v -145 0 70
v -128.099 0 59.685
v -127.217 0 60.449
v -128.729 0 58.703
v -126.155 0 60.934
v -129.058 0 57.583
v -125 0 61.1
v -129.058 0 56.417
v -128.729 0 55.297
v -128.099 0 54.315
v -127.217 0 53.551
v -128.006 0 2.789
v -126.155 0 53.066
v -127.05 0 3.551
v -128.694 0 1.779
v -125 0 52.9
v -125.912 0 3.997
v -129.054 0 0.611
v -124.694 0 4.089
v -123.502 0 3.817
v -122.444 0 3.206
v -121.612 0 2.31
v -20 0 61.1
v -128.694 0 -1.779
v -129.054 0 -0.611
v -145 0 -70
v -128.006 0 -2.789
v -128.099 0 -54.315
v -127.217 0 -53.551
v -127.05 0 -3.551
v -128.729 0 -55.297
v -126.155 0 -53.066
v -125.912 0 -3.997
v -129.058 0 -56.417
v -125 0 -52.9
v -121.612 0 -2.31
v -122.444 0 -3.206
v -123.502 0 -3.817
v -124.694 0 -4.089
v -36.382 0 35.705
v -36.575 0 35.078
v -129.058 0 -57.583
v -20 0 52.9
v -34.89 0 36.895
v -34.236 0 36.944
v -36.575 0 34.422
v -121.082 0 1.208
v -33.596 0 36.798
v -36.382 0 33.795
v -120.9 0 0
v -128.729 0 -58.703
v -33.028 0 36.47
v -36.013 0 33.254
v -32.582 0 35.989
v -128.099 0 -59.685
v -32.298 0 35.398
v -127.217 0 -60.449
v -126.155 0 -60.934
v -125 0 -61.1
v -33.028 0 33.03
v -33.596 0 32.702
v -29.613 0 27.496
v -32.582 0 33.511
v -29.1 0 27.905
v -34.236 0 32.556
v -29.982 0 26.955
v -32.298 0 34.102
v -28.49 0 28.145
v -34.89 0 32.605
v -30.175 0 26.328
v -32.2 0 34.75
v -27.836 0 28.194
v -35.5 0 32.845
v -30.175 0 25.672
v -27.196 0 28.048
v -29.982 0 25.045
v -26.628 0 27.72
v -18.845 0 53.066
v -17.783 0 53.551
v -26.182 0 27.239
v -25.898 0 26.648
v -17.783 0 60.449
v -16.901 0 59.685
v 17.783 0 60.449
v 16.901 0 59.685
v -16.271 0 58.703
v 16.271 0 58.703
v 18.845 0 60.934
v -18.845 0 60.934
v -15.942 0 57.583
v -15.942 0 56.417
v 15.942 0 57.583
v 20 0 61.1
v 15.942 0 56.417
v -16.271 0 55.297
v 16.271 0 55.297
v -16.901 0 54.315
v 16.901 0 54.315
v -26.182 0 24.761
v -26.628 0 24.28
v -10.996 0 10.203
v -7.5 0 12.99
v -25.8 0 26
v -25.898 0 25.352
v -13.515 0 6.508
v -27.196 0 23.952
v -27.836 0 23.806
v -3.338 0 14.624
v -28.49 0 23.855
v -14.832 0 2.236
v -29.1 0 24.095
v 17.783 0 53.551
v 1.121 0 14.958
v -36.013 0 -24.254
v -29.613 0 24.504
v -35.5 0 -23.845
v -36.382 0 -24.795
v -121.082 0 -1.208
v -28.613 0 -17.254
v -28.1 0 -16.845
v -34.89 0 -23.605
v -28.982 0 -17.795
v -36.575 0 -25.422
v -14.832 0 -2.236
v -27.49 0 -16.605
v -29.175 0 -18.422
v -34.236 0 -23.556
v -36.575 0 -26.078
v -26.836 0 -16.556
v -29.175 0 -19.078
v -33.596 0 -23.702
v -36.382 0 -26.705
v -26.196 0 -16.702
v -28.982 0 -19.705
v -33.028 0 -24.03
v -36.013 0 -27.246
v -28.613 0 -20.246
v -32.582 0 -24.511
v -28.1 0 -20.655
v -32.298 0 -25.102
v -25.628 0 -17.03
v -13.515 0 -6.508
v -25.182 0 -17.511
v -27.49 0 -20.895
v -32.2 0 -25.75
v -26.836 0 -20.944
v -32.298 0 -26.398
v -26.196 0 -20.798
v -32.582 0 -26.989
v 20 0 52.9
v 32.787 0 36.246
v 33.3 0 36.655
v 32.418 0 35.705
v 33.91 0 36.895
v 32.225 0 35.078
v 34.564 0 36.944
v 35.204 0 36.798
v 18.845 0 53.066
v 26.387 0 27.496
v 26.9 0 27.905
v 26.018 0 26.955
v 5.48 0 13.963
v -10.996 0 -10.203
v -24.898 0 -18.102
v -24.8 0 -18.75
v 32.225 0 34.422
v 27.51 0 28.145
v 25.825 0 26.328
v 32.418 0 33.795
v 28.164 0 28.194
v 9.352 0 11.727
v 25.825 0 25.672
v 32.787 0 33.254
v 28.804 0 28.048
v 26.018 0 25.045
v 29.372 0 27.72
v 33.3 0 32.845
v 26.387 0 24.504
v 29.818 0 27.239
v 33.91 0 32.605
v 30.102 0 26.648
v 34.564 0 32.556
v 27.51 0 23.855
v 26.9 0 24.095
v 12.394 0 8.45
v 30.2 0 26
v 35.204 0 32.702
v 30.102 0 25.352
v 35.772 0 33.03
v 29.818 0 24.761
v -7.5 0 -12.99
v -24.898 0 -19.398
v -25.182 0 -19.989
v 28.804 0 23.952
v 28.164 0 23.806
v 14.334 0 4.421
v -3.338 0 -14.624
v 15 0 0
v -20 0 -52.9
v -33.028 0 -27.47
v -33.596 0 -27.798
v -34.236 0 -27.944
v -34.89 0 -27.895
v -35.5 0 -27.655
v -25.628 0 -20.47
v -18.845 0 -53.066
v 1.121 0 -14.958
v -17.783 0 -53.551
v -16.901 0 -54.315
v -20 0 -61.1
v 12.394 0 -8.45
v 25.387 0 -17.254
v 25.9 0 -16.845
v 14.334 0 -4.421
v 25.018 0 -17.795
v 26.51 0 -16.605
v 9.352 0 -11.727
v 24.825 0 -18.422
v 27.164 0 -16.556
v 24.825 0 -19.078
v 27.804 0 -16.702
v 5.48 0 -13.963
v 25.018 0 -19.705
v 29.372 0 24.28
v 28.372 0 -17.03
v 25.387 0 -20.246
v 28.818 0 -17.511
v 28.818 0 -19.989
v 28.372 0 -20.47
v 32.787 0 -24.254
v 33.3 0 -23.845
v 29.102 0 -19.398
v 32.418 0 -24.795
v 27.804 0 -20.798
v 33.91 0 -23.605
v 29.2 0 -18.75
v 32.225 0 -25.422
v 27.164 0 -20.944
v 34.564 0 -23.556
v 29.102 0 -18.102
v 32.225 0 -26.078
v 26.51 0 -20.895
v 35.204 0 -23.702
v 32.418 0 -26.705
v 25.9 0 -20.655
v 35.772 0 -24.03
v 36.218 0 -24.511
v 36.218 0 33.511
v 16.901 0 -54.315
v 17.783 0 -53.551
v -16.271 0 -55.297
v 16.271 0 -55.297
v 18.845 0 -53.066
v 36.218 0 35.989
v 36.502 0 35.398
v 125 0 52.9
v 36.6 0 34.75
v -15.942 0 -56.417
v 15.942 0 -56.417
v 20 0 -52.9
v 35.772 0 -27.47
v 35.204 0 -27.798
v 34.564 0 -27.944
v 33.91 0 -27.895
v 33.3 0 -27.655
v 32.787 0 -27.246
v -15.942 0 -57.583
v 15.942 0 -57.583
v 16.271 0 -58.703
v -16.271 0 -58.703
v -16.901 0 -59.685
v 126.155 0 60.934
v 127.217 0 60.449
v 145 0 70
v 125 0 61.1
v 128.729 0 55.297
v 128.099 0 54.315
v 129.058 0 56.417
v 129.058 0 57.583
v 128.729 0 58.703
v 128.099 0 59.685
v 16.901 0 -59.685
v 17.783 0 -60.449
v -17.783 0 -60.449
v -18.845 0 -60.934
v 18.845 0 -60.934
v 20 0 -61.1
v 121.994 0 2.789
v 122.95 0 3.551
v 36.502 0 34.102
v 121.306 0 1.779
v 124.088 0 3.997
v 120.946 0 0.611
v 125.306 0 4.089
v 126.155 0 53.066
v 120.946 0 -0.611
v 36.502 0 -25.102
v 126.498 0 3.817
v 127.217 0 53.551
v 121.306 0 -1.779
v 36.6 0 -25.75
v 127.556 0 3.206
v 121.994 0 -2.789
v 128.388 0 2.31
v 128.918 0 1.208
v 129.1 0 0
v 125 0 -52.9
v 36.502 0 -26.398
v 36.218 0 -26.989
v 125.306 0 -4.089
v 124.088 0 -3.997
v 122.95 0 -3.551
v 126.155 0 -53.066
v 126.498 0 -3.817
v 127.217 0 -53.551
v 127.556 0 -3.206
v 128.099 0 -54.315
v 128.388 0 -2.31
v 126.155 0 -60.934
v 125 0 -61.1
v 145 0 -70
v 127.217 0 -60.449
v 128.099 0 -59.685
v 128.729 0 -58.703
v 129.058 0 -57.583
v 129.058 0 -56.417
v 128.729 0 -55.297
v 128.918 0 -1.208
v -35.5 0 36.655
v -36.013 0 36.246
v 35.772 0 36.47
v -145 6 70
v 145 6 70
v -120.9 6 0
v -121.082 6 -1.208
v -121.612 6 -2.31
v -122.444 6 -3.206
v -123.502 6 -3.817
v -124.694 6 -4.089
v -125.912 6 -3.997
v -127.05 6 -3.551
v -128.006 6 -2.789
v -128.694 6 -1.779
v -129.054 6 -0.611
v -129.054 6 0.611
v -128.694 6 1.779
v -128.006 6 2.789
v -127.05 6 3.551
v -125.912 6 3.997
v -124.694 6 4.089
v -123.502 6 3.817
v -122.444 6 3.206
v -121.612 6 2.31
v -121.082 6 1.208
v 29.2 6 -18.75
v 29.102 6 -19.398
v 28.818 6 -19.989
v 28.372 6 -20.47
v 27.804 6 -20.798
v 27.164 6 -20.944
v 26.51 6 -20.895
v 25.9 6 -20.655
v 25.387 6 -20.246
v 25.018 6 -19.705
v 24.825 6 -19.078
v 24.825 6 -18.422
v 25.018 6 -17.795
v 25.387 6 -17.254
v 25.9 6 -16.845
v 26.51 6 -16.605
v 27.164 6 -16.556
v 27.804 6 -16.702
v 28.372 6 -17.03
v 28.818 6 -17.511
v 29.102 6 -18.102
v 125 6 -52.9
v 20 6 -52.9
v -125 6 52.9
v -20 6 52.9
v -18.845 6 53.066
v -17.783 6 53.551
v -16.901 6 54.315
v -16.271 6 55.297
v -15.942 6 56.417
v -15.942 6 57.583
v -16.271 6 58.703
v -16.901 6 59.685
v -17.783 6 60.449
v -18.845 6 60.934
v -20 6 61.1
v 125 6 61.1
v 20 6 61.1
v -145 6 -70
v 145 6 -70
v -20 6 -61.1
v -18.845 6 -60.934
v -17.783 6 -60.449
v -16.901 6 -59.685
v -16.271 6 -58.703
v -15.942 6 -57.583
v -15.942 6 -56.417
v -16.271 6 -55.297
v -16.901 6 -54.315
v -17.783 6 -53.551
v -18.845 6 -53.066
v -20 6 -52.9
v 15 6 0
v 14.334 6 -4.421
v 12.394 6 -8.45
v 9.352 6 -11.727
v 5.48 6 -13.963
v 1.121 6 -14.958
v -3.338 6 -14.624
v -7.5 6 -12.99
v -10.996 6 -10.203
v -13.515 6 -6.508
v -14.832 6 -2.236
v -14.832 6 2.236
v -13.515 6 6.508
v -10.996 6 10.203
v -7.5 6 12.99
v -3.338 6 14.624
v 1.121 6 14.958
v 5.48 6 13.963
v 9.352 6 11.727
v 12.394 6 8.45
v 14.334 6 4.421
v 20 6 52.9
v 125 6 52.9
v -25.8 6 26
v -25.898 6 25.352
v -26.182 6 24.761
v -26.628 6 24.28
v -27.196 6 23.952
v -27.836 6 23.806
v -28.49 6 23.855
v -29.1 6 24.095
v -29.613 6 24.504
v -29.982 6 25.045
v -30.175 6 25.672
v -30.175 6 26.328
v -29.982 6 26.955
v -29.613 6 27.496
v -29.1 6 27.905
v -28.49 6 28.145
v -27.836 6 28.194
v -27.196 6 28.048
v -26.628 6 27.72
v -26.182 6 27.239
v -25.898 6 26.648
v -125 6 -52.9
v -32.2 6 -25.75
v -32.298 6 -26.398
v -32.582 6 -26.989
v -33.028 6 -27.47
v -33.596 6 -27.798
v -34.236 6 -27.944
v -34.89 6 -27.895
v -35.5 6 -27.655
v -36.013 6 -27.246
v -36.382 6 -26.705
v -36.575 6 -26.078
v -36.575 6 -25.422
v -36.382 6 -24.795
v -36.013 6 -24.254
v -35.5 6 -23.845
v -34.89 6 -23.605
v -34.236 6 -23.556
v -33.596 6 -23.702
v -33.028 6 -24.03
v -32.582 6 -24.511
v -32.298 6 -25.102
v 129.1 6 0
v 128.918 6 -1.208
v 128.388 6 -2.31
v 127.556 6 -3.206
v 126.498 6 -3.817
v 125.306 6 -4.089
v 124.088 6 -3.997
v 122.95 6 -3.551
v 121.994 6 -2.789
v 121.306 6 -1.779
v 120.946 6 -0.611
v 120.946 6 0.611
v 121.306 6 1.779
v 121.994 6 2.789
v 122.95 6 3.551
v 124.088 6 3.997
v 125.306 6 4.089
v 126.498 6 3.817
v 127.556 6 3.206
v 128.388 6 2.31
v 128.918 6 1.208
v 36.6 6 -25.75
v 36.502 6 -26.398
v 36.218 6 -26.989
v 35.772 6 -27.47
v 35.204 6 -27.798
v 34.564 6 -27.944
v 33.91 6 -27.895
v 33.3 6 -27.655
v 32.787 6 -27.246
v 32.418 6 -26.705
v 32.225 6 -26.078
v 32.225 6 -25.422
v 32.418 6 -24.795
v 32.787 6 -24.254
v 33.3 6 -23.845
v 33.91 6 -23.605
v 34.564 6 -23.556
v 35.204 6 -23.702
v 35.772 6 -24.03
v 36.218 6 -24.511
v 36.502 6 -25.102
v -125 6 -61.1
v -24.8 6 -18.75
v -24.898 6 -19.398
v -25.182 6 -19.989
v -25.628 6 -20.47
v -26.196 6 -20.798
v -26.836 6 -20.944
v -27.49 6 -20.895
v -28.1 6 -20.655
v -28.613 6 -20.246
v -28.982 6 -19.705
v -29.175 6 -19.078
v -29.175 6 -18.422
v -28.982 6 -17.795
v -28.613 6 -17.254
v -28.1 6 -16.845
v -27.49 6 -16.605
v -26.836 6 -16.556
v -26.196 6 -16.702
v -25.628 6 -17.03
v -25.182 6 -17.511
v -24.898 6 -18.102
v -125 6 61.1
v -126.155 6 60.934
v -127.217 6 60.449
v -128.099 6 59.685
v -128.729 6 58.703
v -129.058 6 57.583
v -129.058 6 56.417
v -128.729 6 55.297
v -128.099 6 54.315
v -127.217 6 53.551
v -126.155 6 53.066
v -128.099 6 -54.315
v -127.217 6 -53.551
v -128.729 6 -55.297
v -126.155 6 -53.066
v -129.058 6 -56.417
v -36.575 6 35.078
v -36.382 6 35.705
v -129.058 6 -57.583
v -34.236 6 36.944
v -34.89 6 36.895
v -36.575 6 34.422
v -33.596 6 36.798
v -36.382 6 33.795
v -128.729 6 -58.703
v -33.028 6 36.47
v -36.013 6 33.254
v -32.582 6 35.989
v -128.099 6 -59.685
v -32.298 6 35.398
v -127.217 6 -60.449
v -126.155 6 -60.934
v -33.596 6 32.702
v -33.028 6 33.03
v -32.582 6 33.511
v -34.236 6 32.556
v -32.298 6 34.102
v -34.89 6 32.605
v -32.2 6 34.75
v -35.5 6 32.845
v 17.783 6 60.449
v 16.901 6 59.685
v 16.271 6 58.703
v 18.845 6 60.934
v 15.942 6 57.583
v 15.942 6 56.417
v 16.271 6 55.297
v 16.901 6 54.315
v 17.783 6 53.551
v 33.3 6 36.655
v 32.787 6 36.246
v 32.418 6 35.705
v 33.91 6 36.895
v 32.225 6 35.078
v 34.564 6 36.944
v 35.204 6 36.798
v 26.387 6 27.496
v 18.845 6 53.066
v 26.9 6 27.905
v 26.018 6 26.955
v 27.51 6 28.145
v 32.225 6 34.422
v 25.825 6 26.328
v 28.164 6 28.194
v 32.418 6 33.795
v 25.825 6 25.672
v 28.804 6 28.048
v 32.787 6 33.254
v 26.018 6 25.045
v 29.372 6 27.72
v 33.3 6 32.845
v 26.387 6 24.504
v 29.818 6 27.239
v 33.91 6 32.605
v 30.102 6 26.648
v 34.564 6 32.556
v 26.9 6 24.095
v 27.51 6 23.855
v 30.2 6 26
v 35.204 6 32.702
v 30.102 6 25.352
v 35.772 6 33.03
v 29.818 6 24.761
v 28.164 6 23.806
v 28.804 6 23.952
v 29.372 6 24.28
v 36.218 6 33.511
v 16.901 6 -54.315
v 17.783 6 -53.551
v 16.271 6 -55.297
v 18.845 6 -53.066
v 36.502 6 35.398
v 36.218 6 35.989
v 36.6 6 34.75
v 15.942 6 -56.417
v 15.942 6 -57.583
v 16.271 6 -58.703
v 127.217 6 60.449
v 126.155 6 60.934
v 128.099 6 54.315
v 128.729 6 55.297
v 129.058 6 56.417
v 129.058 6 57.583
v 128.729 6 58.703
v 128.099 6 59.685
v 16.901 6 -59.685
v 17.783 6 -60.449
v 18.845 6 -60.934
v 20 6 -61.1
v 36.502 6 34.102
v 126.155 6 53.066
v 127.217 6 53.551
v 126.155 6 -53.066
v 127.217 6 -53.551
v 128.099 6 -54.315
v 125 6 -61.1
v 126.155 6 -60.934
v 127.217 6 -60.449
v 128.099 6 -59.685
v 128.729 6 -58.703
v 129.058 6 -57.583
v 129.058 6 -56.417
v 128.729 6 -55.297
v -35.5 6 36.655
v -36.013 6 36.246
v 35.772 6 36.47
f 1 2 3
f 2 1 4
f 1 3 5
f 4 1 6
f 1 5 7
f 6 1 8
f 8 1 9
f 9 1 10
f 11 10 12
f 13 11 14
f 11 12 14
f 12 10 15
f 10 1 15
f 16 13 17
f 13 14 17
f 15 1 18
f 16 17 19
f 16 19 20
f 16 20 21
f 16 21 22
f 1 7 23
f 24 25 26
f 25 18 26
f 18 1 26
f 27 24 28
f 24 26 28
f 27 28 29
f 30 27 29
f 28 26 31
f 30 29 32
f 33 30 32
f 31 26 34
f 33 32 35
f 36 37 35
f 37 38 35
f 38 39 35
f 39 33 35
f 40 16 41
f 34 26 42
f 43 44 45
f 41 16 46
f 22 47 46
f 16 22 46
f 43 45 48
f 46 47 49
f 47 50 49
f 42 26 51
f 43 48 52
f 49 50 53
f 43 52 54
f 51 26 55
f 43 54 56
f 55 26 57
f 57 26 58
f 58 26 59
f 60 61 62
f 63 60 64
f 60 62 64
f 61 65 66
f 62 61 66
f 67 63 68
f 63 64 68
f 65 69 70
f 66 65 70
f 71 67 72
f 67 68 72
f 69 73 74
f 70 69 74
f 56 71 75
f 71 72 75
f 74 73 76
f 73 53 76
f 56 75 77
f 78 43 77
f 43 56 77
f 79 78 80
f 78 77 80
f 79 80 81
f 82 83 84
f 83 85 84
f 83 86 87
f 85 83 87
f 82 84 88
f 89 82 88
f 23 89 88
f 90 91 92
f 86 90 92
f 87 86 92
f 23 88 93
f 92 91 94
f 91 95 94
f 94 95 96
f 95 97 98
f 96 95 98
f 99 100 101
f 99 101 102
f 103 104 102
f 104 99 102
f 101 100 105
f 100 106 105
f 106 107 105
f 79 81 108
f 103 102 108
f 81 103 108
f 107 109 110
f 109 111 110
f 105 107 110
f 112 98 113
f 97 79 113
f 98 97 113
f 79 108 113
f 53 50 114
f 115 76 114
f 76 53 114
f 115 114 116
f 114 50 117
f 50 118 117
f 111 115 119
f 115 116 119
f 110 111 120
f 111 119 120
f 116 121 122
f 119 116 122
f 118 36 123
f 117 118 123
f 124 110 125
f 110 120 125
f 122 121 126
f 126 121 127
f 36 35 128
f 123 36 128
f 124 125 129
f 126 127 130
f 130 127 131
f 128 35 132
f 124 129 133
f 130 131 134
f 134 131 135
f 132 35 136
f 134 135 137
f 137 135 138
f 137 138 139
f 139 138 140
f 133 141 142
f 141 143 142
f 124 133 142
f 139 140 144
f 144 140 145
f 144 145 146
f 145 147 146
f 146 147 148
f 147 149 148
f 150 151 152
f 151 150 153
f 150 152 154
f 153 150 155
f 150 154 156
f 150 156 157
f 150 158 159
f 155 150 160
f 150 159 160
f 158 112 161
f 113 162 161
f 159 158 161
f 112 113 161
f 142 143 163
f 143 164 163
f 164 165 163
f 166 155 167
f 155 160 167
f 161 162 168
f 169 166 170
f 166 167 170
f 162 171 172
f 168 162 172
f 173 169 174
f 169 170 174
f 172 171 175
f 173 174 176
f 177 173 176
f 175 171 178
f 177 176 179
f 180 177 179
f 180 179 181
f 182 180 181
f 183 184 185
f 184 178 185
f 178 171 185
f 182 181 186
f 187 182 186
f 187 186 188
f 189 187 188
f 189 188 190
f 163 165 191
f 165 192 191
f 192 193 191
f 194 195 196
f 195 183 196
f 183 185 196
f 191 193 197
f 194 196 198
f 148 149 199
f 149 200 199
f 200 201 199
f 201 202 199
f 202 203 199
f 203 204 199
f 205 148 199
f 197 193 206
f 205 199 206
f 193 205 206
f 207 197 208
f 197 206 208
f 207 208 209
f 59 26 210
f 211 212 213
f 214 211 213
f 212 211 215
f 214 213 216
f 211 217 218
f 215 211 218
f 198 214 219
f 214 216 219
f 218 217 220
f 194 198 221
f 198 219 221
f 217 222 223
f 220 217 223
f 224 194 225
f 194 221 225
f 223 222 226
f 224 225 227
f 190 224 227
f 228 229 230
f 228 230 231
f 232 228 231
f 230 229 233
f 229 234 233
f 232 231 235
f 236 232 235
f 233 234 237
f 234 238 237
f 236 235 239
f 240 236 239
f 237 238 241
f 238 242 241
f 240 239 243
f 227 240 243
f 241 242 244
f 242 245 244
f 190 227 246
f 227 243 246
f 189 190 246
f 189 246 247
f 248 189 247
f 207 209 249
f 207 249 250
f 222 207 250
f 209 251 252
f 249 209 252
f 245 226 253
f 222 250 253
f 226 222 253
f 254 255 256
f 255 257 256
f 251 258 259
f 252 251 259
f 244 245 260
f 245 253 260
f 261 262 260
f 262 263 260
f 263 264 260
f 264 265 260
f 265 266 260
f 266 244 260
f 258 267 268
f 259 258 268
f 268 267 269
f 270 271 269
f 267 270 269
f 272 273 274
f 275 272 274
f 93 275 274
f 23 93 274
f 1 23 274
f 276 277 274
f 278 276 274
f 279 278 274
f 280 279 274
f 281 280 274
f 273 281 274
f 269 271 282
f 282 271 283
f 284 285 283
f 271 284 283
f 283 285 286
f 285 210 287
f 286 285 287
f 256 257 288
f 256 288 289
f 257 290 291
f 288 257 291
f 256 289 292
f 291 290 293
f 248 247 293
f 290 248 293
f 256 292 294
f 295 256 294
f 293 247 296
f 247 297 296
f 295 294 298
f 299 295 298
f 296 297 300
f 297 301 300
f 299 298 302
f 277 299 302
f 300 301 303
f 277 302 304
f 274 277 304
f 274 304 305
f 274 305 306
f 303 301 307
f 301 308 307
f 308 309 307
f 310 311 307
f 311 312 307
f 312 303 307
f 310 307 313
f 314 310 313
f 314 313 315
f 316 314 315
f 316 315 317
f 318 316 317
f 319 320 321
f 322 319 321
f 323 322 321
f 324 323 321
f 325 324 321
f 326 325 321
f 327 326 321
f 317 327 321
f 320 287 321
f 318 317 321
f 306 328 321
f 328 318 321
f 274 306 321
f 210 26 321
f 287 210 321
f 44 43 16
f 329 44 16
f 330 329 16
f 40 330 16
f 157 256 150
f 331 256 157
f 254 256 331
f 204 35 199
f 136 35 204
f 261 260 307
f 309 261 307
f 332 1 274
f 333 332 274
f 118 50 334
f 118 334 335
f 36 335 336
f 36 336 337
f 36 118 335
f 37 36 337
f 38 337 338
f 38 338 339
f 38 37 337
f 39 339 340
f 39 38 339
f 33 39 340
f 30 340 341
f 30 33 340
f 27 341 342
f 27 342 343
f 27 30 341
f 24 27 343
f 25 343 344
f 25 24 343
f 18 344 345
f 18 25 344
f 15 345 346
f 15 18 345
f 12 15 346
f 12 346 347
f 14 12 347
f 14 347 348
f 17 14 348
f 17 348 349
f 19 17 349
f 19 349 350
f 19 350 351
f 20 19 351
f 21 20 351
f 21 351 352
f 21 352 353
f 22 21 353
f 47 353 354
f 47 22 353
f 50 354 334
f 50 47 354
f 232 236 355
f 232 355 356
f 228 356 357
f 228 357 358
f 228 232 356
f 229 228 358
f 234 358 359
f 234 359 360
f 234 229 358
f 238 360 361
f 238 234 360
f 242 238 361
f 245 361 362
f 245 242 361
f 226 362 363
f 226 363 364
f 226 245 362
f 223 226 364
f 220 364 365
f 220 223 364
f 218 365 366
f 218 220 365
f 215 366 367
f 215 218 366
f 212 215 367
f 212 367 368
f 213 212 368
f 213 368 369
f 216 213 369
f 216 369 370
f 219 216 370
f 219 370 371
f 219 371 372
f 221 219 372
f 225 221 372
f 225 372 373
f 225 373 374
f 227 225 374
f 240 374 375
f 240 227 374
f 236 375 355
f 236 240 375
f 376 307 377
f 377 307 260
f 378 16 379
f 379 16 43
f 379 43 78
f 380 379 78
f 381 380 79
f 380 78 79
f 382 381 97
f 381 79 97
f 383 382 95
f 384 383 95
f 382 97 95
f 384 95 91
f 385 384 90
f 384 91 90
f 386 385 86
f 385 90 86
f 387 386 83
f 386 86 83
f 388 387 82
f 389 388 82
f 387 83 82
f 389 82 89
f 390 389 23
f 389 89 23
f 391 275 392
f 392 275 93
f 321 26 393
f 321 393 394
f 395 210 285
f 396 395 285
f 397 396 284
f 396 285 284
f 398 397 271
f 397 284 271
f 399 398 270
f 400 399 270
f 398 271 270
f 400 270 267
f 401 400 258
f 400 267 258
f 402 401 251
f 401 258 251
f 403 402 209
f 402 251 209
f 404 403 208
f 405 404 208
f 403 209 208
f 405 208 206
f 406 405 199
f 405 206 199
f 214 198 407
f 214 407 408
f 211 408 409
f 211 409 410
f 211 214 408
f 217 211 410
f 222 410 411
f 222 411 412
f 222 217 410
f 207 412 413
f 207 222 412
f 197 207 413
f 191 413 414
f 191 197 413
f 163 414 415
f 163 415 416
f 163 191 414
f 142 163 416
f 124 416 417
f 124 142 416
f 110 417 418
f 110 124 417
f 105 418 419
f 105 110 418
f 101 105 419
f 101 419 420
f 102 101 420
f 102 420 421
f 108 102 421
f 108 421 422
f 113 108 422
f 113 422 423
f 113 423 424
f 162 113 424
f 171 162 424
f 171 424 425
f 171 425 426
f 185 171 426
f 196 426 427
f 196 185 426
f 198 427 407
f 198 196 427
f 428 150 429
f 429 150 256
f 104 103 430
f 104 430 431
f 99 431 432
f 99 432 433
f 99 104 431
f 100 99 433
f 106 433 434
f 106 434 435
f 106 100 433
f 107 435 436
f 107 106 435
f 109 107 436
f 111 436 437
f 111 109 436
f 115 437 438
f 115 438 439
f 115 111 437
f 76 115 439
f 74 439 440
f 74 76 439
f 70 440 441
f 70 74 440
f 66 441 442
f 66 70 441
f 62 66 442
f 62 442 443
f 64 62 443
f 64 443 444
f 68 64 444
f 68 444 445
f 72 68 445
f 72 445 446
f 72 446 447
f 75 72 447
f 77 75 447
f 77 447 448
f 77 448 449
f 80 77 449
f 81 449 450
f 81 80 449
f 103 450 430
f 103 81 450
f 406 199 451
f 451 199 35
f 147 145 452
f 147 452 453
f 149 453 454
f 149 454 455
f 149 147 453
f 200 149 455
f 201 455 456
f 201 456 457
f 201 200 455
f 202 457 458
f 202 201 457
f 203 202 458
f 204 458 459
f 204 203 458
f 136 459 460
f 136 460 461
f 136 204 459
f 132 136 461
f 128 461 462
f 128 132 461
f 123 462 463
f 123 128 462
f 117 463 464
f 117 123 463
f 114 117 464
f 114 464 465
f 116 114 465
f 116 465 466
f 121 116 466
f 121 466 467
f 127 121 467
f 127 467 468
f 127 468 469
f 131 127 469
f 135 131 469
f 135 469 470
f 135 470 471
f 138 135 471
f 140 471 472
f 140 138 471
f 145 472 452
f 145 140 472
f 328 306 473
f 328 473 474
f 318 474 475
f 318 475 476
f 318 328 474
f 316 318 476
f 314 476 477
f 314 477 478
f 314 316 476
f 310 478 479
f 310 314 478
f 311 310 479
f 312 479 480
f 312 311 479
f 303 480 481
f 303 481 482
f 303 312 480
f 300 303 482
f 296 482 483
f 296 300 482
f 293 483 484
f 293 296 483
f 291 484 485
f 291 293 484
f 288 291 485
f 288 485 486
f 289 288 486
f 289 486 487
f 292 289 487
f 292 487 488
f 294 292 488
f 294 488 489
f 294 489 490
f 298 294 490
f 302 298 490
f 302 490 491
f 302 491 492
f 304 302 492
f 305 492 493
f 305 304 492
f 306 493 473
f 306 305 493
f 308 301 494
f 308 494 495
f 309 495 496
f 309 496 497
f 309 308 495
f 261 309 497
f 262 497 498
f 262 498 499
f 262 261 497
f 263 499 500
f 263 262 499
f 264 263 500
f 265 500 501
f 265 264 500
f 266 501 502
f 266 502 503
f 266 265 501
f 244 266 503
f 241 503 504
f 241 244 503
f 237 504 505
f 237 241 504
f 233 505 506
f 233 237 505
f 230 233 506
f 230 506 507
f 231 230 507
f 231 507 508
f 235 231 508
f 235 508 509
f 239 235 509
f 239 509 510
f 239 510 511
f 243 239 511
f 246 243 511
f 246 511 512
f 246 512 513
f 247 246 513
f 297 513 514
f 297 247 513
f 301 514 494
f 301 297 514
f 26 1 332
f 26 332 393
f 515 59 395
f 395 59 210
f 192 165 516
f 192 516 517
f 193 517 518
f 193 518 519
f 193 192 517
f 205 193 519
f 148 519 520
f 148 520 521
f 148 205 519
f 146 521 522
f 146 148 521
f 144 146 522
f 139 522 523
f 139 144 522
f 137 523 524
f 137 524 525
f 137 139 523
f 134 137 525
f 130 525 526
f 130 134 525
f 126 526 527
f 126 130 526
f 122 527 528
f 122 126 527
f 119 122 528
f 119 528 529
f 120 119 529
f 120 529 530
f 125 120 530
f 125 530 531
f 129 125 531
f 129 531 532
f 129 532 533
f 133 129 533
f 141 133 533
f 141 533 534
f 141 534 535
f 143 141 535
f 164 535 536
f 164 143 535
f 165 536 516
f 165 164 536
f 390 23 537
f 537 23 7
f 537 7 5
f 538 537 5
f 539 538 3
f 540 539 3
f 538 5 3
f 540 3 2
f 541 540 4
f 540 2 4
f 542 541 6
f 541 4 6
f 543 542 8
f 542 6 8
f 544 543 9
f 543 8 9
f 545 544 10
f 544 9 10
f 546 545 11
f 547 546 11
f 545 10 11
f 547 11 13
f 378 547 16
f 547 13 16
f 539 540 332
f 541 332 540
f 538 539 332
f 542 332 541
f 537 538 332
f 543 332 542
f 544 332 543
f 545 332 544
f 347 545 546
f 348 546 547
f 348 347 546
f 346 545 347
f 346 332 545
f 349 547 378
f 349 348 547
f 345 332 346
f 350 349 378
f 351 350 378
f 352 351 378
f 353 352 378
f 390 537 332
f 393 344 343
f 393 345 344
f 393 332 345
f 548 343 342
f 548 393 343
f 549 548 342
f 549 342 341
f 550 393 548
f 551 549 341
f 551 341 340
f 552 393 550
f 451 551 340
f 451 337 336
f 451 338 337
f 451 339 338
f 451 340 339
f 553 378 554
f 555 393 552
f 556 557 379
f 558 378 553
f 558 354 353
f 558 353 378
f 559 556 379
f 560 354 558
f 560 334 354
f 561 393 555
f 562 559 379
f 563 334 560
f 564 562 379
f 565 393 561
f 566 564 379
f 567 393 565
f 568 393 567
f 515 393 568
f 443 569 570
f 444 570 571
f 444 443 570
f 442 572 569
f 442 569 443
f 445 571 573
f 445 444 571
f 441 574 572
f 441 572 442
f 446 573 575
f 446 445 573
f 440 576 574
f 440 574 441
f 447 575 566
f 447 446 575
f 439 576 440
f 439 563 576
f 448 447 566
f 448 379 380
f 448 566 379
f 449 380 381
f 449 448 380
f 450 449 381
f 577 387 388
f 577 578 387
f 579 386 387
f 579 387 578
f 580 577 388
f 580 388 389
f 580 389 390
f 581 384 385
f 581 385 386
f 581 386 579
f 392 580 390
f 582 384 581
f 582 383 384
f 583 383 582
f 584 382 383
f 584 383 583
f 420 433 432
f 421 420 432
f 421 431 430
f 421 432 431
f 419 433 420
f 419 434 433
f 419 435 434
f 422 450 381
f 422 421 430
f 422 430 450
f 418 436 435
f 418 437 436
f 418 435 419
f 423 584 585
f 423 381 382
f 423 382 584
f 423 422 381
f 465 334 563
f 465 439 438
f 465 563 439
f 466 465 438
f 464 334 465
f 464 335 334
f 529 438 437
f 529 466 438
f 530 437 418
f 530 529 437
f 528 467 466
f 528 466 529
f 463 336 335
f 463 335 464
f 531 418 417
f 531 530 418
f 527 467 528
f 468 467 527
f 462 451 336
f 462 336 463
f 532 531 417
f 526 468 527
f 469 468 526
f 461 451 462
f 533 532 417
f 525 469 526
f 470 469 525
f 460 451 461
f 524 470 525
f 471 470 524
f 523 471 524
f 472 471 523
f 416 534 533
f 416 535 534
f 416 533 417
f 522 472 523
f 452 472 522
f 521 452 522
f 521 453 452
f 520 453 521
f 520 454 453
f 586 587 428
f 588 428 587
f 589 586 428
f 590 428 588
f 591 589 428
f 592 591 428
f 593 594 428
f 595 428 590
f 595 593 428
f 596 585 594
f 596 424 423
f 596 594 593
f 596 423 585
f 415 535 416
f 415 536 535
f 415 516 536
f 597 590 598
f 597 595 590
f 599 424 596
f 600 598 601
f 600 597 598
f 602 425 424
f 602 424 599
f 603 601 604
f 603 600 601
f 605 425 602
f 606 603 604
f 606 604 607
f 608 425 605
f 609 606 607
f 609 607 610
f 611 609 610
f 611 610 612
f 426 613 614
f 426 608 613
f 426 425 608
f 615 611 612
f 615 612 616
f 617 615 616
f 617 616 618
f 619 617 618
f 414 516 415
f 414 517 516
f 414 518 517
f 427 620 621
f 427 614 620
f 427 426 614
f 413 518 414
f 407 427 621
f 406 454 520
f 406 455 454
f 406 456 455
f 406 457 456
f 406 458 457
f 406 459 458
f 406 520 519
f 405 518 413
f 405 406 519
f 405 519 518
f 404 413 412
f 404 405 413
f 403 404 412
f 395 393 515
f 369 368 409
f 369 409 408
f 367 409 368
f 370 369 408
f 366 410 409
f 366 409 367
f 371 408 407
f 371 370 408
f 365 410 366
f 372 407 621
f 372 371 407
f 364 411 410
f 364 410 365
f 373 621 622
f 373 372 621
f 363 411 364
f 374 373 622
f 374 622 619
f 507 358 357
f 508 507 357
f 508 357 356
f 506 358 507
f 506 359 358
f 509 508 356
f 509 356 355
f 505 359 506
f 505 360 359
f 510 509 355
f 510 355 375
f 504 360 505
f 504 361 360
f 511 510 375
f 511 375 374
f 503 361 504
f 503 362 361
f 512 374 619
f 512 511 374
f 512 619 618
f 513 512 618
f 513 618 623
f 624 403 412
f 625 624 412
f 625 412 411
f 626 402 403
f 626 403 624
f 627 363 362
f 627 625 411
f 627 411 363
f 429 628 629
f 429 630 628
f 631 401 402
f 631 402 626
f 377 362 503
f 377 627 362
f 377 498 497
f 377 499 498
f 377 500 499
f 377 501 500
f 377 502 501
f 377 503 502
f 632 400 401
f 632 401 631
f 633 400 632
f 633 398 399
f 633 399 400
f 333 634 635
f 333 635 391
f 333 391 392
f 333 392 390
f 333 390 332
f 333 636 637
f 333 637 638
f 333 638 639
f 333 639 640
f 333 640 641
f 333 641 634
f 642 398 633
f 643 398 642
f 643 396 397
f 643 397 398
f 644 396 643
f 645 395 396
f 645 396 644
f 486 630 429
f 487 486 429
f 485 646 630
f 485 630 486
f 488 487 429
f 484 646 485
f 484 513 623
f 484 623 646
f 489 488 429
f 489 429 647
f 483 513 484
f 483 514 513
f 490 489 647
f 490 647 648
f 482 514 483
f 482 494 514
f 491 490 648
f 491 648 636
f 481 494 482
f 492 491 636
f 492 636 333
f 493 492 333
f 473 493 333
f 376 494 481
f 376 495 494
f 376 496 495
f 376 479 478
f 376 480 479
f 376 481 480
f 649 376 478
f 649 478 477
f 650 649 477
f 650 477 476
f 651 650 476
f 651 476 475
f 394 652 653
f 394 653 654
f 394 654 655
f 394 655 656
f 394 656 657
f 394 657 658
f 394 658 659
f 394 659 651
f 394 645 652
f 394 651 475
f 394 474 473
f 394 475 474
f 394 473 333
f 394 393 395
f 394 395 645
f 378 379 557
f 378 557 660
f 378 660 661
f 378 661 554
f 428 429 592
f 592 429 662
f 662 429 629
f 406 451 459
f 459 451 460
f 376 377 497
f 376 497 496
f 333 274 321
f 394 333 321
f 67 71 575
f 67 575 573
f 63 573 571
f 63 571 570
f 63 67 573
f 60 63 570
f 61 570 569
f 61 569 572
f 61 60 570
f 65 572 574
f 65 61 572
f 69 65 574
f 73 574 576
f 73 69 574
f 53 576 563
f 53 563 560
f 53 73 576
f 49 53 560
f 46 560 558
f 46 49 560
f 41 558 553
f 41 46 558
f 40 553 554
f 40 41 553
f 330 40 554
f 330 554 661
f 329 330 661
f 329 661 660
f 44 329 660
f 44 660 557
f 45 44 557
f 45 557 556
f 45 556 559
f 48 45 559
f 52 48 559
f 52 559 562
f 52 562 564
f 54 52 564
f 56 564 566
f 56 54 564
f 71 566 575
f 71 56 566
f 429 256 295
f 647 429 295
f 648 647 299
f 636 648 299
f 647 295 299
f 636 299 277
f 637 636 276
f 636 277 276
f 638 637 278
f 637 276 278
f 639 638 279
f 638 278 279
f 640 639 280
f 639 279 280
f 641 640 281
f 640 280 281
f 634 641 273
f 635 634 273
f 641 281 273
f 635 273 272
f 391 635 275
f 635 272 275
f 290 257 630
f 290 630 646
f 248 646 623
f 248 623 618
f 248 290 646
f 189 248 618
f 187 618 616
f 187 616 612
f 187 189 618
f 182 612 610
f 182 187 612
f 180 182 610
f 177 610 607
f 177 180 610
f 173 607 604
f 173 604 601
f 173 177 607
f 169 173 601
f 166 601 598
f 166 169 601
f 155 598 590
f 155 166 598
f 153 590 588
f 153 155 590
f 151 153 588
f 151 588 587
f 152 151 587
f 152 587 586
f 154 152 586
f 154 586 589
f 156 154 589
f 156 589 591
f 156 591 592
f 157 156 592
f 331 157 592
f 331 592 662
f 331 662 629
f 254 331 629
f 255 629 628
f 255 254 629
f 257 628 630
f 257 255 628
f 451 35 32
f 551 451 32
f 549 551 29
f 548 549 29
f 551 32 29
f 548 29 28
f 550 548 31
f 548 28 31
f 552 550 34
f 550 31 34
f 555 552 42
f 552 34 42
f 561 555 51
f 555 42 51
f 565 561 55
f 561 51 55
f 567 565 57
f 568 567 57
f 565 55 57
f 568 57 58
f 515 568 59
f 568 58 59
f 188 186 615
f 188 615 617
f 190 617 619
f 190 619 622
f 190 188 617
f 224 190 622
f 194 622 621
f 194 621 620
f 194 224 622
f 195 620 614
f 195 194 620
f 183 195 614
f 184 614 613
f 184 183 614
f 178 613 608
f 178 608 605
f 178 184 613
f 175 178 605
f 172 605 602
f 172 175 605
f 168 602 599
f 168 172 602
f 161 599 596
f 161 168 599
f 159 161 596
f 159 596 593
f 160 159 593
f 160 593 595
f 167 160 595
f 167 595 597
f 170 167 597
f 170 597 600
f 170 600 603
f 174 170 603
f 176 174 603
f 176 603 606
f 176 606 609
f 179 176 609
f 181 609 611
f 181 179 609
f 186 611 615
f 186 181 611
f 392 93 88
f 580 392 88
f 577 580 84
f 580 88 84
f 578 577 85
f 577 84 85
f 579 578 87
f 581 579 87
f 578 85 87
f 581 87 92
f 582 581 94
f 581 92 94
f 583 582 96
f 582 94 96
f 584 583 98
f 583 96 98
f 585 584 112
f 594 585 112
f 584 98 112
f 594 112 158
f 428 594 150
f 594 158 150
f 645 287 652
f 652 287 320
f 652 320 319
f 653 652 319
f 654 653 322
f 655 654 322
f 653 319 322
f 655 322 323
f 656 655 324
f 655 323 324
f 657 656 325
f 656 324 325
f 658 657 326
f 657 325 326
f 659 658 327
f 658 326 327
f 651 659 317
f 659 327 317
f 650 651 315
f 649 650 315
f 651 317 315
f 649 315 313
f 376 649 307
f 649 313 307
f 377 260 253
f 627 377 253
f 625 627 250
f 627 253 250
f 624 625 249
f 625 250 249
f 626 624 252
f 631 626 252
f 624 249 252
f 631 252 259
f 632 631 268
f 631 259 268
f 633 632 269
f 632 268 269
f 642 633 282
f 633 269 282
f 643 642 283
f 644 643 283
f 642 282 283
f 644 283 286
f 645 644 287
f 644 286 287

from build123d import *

# Parameters (mm, degrees)
SKETCH_1_W      = 290
SKETCH_1_H      = 140
SKETCH_1_R      = 4.1
SKETCH_1_R_2    = 15
SKETCH_1_R_3    = 2.2
EXTRUDE_1_DEPTH = 6


with BuildPart() as part:
    # Эскиз1 → Бобышка-Вытянуть1 (new body)
    with BuildSketch(Plane(origin=(0, 0, 0), x_dir=(1, 0, 0), z_dir=(0, 1, 0))):
        Rectangle(SKETCH_1_W, SKETCH_1_H)
        with Locations((-125, 0)):
            Circle(SKETCH_1_R, mode=Mode.SUBTRACT)
        with Locations((125, 0)):
            Circle(SKETCH_1_R, mode=Mode.SUBTRACT)
        Circle(SKETCH_1_R_2, mode=Mode.SUBTRACT)
        with Locations((-34.4, 25.75)):
            Circle(SKETCH_1_R_3, mode=Mode.SUBTRACT)
        with Locations((34.4, 25.75)):
            Circle(SKETCH_1_R_3, mode=Mode.SUBTRACT)
        with Locations((-28, -26)):
            Circle(SKETCH_1_R_3, mode=Mode.SUBTRACT)
        with Locations((-34.4, -34.75)):
            Circle(SKETCH_1_R_3, mode=Mode.SUBTRACT)
        with Locations((-27, 18.75)):
            Circle(SKETCH_1_R_3, mode=Mode.SUBTRACT)
        with Locations((28, -26)):
            Circle(SKETCH_1_R_3, mode=Mode.SUBTRACT)
        with Locations((27, 18.75)):
            Circle(SKETCH_1_R_3, mode=Mode.SUBTRACT)
        with Locations((34.4, -34.75)):
            Circle(SKETCH_1_R_3, mode=Mode.SUBTRACT)
        with BuildLine():
            Line((-125, 61.1), (-20, 61.1))
            ThreePointArc((-20, 61.1), (-15.9, 57), (-20, 52.9))
            Line((-20, 52.9), (-125, 52.9))
            ThreePointArc((-125, 52.9), (-129.1, 57), (-125, 61.1))
        make_face(mode=Mode.SUBTRACT)
        with BuildLine():
            Line((-125, -52.9), (-20, -52.9))
            ThreePointArc((-20, -52.9), (-15.9, -57), (-20, -61.1))
            Line((-20, -61.1), (-125, -61.1))
            ThreePointArc((-125, -61.1), (-129.1, -57), (-125, -52.9))
        make_face(mode=Mode.SUBTRACT)
        with BuildLine():
            Line((125, -61.1), (20, -61.1))
            ThreePointArc((20, -61.1), (15.9, -57), (20, -52.9))
            Line((20, -52.9), (125, -52.9))
            ThreePointArc((125, -52.9), (129.1, -57), (125, -61.1))
        make_face(mode=Mode.SUBTRACT)
        with BuildLine():
            Line((125, 52.9), (20, 52.9))
            ThreePointArc((20, 52.9), (15.9, 57), (20, 61.1))
            Line((20, 61.1), (125, 61.1))
            ThreePointArc((125, 61.1), (129.1, 57), (125, 52.9))
        make_face(mode=Mode.SUBTRACT)
    extrude(amount=EXTRUDE_1_DEPTH)


solid = part.part
